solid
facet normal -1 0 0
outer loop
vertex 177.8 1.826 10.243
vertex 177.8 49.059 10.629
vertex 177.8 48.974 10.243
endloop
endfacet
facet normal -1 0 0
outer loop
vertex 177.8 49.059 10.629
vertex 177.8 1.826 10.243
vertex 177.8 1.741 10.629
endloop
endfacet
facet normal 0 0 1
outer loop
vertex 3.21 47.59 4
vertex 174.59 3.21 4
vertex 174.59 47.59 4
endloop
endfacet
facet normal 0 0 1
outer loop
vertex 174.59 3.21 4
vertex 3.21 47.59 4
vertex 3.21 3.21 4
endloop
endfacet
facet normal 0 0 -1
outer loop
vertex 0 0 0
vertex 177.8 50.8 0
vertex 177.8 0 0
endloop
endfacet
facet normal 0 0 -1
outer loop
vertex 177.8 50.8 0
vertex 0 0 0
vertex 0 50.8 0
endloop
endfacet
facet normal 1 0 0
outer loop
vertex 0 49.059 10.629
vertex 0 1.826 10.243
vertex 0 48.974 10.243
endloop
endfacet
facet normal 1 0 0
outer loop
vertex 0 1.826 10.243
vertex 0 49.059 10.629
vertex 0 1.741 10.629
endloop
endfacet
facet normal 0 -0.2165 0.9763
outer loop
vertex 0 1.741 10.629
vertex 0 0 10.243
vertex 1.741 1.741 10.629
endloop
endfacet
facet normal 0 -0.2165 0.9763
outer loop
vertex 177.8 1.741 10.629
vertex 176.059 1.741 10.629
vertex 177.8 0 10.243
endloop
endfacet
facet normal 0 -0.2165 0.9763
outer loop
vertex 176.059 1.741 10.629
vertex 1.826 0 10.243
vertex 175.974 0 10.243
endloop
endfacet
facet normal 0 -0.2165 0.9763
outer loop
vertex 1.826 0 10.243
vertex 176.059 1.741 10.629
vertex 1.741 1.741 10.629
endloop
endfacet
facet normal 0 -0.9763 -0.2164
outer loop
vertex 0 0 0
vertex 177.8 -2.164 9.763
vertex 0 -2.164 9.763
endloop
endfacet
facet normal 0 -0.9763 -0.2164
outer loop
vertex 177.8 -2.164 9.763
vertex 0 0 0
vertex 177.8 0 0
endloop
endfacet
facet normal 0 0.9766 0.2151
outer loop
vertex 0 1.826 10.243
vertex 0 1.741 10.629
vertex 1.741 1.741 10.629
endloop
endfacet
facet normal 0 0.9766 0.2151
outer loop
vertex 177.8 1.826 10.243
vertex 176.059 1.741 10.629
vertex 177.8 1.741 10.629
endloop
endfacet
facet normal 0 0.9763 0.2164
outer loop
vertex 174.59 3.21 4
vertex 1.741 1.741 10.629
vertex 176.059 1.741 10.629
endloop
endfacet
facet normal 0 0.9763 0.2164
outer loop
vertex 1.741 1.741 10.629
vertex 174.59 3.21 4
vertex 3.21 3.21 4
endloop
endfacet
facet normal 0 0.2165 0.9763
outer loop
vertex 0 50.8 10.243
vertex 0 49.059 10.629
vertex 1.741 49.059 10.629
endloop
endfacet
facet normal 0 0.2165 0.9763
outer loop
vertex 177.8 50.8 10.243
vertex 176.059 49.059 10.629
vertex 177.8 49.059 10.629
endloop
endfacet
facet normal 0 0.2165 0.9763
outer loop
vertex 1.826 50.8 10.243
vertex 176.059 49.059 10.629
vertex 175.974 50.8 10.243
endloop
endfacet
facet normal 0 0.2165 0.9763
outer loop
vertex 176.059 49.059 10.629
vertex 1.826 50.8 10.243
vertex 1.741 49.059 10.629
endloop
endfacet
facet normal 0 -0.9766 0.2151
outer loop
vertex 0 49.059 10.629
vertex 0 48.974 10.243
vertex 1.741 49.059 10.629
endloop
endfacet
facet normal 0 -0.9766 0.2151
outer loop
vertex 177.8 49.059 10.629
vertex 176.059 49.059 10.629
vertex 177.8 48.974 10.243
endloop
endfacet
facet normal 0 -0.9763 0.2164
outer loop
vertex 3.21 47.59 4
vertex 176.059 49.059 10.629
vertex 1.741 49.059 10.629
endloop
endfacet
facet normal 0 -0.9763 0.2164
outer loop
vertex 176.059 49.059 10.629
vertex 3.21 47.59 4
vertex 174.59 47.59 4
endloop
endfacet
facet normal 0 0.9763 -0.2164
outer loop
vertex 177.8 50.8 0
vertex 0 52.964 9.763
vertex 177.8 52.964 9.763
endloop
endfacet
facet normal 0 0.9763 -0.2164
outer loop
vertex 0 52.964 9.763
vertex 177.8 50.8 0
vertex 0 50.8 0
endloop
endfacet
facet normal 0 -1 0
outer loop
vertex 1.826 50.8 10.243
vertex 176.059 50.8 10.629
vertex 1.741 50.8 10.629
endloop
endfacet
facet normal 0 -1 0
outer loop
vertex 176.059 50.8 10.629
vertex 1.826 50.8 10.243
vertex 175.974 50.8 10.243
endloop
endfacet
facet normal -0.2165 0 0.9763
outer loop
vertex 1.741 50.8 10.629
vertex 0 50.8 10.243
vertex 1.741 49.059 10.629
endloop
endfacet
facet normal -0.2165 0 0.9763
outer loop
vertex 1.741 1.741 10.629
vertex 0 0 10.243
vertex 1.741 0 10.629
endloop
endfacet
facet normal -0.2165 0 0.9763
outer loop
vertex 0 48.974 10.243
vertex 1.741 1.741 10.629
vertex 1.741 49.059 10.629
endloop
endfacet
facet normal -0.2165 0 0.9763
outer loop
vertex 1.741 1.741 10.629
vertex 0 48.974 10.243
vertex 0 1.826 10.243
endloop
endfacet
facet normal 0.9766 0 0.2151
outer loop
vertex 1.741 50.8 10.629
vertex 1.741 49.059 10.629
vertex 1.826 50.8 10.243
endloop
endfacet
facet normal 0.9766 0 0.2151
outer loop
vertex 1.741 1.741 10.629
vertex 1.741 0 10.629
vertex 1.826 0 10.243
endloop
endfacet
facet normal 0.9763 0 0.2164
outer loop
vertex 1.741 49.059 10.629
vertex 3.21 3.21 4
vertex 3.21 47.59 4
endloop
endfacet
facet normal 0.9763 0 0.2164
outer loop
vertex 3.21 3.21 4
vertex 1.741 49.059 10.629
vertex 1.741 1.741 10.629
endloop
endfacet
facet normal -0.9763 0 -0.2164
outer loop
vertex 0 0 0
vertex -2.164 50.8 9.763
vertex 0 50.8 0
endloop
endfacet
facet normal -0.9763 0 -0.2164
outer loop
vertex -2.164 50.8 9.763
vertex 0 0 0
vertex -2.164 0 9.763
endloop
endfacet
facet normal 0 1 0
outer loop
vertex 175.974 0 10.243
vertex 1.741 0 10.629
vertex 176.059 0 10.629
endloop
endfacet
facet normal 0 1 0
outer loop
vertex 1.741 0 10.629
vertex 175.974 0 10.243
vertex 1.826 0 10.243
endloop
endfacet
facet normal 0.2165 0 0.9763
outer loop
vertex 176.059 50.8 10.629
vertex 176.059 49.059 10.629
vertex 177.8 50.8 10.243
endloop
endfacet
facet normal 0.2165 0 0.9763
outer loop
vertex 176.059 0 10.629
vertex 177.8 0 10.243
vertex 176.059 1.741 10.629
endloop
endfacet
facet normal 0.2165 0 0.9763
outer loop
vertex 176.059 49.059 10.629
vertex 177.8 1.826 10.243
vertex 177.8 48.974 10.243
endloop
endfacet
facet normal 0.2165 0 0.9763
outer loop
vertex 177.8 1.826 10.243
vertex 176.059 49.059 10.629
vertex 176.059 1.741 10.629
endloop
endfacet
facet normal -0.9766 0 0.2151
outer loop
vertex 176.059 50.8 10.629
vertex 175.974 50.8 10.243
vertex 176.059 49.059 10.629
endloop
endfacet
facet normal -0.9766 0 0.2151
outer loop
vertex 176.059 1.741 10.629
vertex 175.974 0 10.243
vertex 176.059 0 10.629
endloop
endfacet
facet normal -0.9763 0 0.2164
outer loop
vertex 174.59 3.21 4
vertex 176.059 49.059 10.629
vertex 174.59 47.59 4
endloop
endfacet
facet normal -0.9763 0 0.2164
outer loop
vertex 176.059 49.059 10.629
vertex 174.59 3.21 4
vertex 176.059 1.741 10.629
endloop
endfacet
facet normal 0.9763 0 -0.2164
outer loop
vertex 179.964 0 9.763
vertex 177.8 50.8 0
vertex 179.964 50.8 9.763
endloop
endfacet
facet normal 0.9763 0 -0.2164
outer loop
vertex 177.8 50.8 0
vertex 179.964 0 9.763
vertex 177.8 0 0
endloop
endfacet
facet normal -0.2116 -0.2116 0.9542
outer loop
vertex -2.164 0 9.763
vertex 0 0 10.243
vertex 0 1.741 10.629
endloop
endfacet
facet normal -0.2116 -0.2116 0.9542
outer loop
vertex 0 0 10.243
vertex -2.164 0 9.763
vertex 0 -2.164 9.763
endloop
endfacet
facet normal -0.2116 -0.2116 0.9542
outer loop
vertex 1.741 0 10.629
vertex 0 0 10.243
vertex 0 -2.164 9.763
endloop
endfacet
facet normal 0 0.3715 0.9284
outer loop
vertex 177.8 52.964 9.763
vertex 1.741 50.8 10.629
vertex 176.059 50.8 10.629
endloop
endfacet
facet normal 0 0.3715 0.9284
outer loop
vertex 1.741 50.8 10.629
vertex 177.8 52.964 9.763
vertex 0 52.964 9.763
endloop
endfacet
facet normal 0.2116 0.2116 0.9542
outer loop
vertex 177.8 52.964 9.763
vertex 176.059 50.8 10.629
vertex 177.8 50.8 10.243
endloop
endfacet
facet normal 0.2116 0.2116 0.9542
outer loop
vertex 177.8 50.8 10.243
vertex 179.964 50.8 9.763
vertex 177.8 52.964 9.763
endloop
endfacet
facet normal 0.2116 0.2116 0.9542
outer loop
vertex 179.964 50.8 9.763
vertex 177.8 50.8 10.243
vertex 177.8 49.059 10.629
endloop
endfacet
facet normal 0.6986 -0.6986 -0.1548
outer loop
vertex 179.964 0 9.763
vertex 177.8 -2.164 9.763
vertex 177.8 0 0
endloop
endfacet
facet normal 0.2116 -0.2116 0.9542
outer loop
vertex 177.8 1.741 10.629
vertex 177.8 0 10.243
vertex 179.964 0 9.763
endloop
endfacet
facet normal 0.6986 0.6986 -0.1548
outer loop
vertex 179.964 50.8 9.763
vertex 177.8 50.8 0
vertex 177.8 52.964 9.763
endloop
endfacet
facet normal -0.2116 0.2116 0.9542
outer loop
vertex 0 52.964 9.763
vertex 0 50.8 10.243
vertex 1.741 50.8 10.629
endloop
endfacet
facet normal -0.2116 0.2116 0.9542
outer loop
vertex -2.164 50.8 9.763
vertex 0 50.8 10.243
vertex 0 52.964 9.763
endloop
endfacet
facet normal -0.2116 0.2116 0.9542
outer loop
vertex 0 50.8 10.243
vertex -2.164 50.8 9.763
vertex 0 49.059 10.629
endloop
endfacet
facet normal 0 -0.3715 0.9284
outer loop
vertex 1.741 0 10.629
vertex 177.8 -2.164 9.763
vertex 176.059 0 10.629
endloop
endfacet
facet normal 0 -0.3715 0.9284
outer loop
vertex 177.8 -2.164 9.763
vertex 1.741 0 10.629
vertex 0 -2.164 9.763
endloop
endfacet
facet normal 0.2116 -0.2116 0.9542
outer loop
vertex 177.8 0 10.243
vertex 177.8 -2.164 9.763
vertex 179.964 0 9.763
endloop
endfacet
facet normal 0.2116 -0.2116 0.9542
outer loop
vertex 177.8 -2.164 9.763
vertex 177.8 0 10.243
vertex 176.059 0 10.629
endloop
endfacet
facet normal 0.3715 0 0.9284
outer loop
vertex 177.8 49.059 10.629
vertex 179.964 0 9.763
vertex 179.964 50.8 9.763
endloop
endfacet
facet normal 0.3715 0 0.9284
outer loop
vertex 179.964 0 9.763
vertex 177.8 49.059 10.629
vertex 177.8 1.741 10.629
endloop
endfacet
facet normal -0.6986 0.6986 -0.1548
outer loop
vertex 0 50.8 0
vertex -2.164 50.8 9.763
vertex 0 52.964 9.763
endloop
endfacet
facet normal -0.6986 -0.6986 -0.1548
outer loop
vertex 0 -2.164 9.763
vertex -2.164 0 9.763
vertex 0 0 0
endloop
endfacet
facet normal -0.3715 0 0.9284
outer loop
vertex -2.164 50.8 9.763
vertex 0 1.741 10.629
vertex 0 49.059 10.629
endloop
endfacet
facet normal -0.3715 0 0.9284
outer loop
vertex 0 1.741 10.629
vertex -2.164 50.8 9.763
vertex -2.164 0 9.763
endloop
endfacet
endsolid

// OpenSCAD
length = 177.8;
width = 50.8;
thickness=4;
ledge_height=10;
ledge_angle=12.5;

module tray() {
    cube([length,width,thickness]);

    rotate([ledge_angle,0,0])
    cube([length,thickness,ledge_height]);

    translate([length,width,0])
    rotate([0,0,180])
    rotate([ledge_angle,0,0])
    cube([length,thickness,ledge_height]);

    rotate([0,-ledge_angle,0])
    cube([thickness,width,ledge_height]);

    translate([length,width,0])
    rotate([0,0,180])
    rotate([0,-ledge_angle,0])
    cube([thickness,width,ledge_height]);
}

union() {
    tray();
    difference() {
        hull() tray();
        cube([length,width,ledge_height*2]);
    }
}
